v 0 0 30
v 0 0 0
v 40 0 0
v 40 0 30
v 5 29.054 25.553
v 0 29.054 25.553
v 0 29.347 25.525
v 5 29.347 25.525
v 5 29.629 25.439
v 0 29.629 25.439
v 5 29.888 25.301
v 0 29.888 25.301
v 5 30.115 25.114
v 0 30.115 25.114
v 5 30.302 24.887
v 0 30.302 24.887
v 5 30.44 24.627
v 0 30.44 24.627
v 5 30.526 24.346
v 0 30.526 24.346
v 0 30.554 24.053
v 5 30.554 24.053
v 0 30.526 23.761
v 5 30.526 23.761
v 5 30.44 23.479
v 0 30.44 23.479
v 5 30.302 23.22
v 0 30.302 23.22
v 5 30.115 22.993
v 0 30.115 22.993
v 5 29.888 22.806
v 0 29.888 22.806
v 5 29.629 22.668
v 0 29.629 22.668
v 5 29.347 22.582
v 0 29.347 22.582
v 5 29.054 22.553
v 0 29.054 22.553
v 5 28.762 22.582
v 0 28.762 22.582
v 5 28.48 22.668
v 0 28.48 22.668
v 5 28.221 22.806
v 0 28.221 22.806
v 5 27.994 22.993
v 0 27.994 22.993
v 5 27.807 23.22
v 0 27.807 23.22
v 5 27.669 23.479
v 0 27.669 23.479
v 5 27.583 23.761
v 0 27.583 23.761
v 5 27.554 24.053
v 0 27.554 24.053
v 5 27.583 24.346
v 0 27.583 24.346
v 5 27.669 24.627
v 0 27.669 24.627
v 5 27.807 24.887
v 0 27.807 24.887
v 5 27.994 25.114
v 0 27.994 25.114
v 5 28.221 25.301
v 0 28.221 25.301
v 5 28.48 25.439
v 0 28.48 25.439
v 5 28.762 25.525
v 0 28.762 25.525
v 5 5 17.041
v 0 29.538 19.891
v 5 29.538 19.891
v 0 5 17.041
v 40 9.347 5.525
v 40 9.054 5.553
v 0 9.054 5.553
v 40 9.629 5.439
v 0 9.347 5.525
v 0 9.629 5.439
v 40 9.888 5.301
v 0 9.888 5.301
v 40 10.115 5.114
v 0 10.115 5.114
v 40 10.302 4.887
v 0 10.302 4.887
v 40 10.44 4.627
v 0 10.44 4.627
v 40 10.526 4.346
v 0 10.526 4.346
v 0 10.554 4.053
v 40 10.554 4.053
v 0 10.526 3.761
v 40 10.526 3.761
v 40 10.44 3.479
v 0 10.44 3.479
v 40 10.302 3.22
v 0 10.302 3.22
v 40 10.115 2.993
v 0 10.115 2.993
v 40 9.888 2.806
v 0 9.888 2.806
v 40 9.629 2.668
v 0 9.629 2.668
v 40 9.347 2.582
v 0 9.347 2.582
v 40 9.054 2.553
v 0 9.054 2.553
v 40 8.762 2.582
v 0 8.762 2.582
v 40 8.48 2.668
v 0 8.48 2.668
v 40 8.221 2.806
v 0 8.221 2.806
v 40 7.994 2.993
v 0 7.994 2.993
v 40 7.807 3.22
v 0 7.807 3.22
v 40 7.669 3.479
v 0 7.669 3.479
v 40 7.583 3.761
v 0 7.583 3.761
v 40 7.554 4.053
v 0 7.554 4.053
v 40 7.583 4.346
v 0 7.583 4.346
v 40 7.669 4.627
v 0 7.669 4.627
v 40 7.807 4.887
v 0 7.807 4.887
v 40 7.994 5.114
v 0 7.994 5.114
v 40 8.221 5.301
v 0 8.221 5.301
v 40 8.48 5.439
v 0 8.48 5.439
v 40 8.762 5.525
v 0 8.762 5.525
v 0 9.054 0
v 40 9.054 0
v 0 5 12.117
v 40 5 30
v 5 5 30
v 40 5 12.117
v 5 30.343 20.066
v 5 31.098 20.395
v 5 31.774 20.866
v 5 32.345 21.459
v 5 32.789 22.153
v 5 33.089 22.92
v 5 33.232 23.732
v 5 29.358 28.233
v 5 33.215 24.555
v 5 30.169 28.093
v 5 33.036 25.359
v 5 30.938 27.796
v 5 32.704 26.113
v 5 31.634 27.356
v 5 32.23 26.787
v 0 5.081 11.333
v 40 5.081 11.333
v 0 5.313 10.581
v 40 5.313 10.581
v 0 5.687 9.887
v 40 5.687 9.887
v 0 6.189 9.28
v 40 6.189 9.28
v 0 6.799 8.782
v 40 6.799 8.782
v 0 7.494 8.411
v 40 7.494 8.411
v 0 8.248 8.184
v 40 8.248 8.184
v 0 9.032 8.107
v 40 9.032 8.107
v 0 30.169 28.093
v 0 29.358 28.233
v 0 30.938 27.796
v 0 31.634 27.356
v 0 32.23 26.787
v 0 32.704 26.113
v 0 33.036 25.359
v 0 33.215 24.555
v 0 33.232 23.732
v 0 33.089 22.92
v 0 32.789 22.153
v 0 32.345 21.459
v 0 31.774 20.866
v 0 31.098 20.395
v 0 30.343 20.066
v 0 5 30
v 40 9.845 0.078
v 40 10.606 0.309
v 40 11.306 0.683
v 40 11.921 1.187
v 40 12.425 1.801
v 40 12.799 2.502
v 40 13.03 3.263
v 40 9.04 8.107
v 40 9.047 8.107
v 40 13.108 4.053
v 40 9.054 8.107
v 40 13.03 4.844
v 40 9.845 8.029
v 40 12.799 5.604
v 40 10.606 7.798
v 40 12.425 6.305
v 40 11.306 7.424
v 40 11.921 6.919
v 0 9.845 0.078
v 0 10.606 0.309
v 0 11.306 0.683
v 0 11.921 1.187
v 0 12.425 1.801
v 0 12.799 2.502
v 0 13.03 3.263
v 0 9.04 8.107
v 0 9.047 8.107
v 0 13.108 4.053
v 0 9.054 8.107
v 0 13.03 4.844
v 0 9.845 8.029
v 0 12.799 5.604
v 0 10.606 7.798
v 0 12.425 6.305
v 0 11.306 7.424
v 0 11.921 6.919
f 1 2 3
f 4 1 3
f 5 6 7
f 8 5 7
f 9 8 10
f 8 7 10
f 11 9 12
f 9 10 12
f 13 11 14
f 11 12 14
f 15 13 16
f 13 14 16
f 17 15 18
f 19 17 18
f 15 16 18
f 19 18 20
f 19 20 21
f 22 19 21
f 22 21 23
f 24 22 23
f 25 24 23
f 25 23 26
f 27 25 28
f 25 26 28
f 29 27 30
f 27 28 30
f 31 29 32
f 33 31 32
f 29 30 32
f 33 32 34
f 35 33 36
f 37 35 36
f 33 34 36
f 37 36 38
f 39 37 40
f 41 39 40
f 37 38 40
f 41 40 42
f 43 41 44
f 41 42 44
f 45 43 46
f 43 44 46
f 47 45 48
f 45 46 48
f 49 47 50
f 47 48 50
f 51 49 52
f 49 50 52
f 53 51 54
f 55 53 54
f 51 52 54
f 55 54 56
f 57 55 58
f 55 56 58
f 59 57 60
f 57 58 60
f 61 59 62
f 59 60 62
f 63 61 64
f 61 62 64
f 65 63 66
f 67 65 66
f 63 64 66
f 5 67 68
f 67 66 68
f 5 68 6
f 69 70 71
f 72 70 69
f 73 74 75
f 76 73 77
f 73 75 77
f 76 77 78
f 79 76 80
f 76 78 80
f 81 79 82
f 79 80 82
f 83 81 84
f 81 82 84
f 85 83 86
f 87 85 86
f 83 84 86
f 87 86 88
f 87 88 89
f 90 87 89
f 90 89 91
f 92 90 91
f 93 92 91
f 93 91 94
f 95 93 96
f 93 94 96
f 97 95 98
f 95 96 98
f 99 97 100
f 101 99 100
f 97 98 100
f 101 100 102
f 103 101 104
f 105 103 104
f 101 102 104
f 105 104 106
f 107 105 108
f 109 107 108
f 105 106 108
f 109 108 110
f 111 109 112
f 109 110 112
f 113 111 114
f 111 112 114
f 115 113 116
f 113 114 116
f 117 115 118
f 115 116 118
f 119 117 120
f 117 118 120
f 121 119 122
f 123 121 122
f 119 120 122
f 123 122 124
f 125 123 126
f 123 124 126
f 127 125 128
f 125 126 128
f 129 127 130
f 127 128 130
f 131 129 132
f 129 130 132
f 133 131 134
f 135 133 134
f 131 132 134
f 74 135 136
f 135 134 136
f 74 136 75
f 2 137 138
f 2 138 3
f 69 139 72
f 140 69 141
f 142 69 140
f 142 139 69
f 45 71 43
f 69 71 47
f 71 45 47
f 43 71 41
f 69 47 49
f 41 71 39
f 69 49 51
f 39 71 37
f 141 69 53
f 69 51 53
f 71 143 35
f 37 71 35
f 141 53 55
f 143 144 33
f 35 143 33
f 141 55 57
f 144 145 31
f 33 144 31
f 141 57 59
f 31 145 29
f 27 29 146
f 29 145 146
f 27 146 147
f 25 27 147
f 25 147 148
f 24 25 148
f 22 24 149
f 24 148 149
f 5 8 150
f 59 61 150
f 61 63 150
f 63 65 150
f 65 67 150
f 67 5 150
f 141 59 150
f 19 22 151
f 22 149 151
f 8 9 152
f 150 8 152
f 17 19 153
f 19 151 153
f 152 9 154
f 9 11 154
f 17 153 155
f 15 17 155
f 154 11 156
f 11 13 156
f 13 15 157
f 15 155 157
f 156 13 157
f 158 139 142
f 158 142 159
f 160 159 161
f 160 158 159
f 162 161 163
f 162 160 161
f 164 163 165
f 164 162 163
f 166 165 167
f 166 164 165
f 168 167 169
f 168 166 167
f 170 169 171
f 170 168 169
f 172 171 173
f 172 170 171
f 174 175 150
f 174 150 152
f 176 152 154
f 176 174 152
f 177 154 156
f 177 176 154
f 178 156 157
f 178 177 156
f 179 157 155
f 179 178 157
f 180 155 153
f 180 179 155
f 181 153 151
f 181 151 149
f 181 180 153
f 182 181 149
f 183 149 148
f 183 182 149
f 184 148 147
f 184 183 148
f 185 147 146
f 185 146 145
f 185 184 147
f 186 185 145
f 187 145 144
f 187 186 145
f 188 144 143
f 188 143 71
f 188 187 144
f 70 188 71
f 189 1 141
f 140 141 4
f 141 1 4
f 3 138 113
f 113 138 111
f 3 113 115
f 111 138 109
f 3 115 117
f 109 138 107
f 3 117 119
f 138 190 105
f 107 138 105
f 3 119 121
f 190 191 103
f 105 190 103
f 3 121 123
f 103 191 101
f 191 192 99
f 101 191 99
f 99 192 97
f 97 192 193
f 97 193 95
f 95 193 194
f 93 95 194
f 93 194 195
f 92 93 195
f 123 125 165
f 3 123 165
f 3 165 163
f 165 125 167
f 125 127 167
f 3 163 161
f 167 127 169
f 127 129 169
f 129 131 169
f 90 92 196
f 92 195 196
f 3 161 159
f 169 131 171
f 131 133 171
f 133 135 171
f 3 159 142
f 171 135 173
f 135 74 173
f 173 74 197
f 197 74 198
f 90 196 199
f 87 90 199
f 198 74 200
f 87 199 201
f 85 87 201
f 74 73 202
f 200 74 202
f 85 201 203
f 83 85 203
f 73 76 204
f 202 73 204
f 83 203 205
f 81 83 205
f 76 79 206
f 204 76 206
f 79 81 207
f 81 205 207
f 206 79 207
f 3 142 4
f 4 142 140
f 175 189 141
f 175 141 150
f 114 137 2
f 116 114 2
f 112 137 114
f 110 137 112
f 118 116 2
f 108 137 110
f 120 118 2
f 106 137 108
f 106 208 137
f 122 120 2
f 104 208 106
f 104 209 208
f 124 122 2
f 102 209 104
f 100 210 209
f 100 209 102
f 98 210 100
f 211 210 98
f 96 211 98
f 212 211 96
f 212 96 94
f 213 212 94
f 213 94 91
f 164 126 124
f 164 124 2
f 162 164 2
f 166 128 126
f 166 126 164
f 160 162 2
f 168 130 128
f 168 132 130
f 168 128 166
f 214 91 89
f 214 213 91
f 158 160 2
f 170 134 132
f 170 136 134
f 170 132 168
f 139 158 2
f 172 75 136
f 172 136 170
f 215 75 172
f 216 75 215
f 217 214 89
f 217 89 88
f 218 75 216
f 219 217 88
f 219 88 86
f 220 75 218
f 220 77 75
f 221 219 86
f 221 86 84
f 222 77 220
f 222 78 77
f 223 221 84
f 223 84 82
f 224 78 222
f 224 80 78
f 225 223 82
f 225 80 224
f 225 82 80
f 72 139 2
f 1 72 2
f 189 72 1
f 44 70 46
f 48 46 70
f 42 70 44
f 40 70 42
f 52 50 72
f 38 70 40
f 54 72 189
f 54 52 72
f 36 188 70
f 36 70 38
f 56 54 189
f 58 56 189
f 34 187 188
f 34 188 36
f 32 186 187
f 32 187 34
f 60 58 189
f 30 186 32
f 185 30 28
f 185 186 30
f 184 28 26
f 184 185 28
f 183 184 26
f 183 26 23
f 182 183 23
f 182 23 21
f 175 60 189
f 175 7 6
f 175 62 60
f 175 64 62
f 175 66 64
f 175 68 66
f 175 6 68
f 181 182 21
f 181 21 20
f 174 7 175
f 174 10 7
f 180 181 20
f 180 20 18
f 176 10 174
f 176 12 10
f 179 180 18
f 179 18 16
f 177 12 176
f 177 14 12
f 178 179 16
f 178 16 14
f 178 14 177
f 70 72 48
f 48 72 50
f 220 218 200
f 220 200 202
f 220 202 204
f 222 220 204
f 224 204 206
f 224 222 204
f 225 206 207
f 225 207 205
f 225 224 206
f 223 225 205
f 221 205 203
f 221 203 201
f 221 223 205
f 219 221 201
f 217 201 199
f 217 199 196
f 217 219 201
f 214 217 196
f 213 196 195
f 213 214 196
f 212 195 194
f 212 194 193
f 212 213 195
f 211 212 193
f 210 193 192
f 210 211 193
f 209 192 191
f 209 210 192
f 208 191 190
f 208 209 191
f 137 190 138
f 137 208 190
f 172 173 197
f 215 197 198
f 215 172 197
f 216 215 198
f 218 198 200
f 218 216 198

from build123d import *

# Parameters (mm, degrees)
SKETCH1_W           = 40
SKETCH1_H           = 30
BOSS_EXTRUDE1_DEPTH = 5
SKETCH2_R           = 1.5
BOSS_EXTRUDE2_DEPTH = 40
SKETCH4_R           = 1.5
BOSS_EXTRUDE4_DEPTH = 5


with BuildPart() as part:
    # Sketch1 → Boss-Extrude1 (new body)
    with BuildSketch(Plane(origin=(0, 0, 0), x_dir=(1, 0, 0), z_dir=(0, 1, 0))):
        with Locations((20, -15)):
            Rectangle(SKETCH1_W, SKETCH1_H)
    extrude(amount=BOSS_EXTRUDE1_DEPTH)

    # Sketch2 → Boss-Extrude2 (add)
    with BuildSketch(Plane.ZY):
        with BuildLine():
            ThreePointArc((8.106694093, 9.054477386), (4.053347046, 13.107824432), (0, 9.054477386))
            Line((0, 9.054477386), (0, 5))
            Line((0, 5), (12.116930909, 5))
            ThreePointArc((12.116930909, 5), (9.279911424, 6.188818307), (8.106633421, 9.032299844))
            ThreePointArc((8.106633421, 9.032299844), (8.106678925, 9.043388574), (8.106694093, 9.054477386))
        make_face()
        with Locations((4.053347046, 9.054477386)):
            Circle(SKETCH2_R, mode=Mode.SUBTRACT)
    extrude(amount=-BOSS_EXTRUDE2_DEPTH)

    # Sketch4 → Boss-Extrude4 (add)
    with BuildSketch(Plane.ZY):
        with BuildLine():
            Line((30, 5), (28.232674565, 29.357717289))
            ThreePointArc((28.232674565, 29.357717289), (24.143809842, 33.243814974), (19.891005174, 29.537843793))
            Line((19.891005174, 29.537843793), (17.041462837, 5))
            Line((17.041462837, 5), (30, 5))
        make_face()
        with Locations((24.053347046, 29.054477386)):
            Circle(SKETCH4_R, mode=Mode.SUBTRACT)
    extrude(amount=-BOSS_EXTRUDE4_DEPTH)


solid = part.part
